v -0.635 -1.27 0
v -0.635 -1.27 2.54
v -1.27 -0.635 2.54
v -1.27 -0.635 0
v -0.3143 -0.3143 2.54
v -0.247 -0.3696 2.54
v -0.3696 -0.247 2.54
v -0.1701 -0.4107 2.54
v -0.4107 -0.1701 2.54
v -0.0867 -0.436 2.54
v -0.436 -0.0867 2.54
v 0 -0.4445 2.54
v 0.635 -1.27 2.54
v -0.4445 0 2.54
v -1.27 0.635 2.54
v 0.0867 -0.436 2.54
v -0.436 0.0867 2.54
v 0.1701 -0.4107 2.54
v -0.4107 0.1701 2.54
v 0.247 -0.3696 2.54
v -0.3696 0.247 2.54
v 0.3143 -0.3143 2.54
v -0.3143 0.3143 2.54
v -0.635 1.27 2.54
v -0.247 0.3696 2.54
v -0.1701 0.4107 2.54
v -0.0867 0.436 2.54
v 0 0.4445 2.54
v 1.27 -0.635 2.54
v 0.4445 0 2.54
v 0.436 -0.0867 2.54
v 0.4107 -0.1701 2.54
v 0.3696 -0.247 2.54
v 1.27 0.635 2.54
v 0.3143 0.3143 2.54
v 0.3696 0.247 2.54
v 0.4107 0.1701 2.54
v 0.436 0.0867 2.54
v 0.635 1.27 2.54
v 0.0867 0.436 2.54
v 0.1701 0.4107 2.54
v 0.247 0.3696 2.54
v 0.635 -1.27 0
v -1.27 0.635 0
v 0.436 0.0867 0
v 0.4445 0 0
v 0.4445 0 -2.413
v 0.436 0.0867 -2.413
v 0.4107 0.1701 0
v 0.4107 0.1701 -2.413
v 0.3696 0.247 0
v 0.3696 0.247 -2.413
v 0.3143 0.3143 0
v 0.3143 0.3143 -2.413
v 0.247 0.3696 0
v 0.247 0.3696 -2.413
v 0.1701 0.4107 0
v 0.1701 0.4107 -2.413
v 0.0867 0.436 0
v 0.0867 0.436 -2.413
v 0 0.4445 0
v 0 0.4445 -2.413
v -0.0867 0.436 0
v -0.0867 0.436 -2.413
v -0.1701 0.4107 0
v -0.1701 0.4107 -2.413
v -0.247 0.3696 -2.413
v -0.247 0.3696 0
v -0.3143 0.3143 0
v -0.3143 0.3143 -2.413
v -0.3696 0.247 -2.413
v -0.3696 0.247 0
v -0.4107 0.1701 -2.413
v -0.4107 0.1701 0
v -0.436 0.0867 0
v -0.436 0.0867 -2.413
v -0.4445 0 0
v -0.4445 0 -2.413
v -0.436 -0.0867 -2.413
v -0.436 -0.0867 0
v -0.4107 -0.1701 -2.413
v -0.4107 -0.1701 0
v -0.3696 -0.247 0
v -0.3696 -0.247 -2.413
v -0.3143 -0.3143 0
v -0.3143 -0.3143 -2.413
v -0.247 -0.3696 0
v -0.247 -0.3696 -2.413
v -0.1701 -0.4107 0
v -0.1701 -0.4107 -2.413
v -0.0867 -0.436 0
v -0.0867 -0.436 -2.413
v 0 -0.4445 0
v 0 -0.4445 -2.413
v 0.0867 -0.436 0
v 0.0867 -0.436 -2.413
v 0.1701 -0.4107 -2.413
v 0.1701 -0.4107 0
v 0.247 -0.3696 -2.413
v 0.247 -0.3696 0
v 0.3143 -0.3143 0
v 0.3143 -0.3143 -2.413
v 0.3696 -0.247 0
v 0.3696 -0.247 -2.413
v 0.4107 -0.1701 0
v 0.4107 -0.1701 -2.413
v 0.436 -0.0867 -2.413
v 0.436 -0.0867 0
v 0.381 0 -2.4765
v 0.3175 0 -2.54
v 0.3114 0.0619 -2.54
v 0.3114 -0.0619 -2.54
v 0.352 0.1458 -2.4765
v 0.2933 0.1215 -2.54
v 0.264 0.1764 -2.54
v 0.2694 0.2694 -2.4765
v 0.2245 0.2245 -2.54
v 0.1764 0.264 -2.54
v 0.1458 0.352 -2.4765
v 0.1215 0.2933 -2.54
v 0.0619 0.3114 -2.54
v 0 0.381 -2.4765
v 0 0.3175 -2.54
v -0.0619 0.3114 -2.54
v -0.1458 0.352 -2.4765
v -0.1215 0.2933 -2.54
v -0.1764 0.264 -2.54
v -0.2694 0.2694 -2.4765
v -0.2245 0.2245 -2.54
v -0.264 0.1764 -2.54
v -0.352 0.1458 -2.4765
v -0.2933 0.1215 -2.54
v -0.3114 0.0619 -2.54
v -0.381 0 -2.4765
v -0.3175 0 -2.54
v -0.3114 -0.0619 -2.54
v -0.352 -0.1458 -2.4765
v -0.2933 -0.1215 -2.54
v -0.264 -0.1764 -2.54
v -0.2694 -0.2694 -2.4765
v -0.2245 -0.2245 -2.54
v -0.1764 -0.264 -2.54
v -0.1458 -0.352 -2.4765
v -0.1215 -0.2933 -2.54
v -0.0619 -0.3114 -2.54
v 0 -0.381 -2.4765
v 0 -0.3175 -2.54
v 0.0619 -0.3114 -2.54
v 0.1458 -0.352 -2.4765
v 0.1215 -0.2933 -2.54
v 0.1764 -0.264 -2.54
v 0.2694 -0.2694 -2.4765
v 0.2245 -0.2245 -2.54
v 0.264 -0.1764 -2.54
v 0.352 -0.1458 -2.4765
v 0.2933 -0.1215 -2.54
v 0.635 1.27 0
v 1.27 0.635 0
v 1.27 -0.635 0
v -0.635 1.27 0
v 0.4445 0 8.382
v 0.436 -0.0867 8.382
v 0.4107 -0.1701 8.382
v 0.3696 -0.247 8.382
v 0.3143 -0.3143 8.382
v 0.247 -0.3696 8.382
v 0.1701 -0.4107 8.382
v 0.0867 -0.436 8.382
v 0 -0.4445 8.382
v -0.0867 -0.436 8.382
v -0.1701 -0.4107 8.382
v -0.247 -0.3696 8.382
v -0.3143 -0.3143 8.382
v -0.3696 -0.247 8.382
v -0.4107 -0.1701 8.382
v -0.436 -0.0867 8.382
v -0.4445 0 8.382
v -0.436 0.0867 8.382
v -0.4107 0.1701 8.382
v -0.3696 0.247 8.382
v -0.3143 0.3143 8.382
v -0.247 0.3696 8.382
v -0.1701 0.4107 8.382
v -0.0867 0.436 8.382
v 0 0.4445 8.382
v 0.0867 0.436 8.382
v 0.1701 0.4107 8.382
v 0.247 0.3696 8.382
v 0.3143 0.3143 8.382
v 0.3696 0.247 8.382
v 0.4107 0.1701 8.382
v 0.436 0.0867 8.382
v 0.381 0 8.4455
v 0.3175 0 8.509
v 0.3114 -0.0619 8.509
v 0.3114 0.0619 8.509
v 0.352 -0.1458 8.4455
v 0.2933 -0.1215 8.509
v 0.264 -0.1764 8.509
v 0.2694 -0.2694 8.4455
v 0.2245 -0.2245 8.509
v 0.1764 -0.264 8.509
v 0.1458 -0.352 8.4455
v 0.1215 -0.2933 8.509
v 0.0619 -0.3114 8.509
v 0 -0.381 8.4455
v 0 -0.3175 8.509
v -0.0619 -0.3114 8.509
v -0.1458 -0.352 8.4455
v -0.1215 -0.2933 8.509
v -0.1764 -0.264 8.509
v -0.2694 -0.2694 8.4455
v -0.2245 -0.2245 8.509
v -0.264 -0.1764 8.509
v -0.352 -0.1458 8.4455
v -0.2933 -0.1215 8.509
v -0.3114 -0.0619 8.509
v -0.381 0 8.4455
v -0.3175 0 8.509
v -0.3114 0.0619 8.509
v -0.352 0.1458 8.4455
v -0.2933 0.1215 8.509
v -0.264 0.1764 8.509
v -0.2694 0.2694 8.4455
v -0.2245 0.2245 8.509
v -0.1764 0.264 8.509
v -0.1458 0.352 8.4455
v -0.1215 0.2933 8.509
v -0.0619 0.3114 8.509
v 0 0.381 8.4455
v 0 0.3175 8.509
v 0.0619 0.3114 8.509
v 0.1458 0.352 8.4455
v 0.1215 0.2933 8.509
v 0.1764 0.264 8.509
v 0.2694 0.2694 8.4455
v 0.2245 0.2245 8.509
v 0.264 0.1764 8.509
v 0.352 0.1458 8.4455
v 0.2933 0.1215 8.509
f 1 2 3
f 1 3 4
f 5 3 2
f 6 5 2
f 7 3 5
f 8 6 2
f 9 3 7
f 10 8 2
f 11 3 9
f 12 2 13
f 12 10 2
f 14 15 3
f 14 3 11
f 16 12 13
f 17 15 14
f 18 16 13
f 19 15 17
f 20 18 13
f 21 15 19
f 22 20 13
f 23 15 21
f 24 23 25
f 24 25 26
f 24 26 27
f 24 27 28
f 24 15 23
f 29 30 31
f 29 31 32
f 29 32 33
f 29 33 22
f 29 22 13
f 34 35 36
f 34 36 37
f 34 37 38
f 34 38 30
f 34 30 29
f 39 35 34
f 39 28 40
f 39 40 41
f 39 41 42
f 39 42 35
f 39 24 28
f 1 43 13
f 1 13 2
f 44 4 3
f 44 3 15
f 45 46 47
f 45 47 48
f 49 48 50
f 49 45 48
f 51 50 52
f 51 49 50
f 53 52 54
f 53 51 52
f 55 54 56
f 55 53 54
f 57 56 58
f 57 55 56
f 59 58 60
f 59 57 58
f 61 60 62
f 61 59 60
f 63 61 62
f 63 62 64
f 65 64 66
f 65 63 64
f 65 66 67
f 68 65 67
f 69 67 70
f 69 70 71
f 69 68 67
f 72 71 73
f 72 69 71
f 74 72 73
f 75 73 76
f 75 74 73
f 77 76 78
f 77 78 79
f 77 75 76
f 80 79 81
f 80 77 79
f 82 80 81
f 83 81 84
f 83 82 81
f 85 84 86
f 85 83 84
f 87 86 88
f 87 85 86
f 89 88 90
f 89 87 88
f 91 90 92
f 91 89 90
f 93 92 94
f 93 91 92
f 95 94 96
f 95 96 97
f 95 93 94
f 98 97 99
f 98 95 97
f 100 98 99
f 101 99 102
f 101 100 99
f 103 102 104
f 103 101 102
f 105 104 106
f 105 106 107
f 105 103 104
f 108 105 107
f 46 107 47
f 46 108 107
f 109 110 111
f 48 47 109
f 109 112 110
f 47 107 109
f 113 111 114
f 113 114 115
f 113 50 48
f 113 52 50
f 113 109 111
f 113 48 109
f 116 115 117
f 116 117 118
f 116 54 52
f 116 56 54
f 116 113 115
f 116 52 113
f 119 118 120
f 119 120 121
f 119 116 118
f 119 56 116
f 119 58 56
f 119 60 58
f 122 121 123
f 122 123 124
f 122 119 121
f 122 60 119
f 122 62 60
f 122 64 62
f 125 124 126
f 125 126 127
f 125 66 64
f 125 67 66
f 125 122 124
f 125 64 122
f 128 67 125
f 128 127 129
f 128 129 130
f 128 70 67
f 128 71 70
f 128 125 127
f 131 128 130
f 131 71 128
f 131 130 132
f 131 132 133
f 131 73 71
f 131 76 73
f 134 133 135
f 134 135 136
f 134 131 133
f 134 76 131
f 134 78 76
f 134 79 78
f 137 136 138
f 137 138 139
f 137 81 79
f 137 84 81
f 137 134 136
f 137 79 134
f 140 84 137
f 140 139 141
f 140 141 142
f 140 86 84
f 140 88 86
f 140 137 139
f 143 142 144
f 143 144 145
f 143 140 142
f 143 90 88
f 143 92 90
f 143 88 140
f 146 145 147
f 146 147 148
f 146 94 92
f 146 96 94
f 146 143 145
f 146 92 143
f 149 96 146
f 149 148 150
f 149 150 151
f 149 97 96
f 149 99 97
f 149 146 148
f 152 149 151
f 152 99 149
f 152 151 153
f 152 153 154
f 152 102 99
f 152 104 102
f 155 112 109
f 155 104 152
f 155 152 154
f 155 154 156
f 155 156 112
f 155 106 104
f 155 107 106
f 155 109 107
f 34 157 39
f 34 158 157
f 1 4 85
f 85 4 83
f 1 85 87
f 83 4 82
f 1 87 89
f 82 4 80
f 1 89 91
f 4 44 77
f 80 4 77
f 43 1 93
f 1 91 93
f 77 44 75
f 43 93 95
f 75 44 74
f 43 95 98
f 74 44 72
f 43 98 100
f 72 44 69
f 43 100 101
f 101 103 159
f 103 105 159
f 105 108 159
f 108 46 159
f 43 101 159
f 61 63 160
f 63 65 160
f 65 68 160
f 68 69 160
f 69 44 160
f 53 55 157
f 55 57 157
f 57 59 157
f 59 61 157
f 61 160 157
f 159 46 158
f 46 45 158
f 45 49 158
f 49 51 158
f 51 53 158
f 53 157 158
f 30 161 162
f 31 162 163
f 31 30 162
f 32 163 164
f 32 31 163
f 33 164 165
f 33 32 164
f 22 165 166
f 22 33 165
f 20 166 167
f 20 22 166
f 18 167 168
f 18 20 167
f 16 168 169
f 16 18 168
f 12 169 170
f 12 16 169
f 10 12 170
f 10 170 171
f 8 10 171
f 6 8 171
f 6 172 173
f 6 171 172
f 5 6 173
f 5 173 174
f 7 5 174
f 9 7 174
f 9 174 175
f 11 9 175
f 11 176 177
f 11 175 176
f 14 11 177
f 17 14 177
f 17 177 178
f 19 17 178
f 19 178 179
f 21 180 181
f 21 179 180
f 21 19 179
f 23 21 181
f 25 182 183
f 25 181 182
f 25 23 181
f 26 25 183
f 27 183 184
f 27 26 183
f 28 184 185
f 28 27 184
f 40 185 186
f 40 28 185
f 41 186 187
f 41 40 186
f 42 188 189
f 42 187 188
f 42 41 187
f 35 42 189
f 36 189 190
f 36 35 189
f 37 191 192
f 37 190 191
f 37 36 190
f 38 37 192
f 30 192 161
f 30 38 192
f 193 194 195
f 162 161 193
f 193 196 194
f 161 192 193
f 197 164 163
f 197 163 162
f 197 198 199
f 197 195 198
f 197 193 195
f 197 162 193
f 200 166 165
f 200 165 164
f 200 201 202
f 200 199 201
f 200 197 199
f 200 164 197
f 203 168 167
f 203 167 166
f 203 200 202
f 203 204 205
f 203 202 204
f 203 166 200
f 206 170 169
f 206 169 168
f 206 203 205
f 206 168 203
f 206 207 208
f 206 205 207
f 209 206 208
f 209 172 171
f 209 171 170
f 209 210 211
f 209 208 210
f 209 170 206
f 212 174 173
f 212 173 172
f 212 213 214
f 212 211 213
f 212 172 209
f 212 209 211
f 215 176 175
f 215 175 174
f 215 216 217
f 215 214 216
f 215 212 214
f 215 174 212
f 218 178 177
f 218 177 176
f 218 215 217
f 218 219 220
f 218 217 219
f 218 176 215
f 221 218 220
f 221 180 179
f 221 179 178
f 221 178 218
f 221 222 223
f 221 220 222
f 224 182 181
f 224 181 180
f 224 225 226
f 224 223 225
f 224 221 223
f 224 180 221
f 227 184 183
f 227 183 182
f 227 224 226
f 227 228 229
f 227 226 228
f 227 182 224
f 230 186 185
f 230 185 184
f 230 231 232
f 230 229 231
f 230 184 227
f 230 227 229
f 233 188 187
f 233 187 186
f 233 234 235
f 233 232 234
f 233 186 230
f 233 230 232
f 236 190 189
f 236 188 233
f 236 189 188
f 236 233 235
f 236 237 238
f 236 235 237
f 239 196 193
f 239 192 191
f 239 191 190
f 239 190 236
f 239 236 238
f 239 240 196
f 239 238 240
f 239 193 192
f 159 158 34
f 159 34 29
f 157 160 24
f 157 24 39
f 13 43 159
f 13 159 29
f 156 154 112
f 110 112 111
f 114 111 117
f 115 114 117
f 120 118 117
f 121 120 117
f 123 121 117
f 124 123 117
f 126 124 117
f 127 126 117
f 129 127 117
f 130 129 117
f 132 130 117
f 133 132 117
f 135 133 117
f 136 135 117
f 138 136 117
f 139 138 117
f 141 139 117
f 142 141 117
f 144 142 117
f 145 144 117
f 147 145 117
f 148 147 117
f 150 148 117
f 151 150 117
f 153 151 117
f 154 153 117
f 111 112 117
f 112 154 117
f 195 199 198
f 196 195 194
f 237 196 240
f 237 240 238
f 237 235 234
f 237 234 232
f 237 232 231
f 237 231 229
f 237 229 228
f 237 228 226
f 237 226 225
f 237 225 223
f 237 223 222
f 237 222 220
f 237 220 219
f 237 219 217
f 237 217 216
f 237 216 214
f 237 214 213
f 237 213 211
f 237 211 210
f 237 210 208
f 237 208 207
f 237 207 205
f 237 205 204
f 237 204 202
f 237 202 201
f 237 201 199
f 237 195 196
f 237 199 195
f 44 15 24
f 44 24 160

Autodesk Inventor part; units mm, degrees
ref_plane "YZ Plane" through (0, 0, 0) normal (1, 0, 0) x (0, 1, 0)
ref_plane "XZ Plane" through (0, 0, 0) normal (0, 1, 0) x (-1, 0, 0)
ref_plane "XY Plane" through (0, 0, 0) normal (0, 0, 1) x (1, 0, 0)
sketch "Sketch1" plane through (0, 0, 0) normal (0, 0, 1) x (1, 0, 0)
  circle A0 centre (0, 0) radius 0.4445
  dimension "d0" = 0.889
extrude "Extrusion1" add sketch "Sketch1" along normal blind 8.509 and the other way blind 2.54
chamfer "Chamfer1" distance 0.127 angle 45 2 edges at (-0.4445, 0, 8.509) (-0.4445, 0, -2.54)
sketch "Sketch2" plane through (0, 0, 0) normal (0, 0, 1) x (1, 0, 0)
  line L0 (-1.27, 1.27) -> (1.27, 1.27)
  line L1 (1.27, 1.27) -> (1.27, -1.27)
  line L2 (1.27, -1.27) -> (-1.27, -1.27)
  line L3 (-1.27, -1.27) -> (-1.27, 1.27)
  point P0 (0, 0)
  point P1 (1.27, 0)
  point P2 (0, 1.27)
  dimension "d8" = 2.54
  dimension "d9" = 2.54
extrude "Extrusion2" add sketch "Sketch2" along normal blind 2.54
chamfer "Chamfer2" distance 0.635 angle 45 4 edges at (1.27, 1.27, 1.27) (-1.27, 1.27, 1.27) (1.27, -1.27, 1.27) (-1.27, -1.27, 1.27)
properties part number "Pin"
